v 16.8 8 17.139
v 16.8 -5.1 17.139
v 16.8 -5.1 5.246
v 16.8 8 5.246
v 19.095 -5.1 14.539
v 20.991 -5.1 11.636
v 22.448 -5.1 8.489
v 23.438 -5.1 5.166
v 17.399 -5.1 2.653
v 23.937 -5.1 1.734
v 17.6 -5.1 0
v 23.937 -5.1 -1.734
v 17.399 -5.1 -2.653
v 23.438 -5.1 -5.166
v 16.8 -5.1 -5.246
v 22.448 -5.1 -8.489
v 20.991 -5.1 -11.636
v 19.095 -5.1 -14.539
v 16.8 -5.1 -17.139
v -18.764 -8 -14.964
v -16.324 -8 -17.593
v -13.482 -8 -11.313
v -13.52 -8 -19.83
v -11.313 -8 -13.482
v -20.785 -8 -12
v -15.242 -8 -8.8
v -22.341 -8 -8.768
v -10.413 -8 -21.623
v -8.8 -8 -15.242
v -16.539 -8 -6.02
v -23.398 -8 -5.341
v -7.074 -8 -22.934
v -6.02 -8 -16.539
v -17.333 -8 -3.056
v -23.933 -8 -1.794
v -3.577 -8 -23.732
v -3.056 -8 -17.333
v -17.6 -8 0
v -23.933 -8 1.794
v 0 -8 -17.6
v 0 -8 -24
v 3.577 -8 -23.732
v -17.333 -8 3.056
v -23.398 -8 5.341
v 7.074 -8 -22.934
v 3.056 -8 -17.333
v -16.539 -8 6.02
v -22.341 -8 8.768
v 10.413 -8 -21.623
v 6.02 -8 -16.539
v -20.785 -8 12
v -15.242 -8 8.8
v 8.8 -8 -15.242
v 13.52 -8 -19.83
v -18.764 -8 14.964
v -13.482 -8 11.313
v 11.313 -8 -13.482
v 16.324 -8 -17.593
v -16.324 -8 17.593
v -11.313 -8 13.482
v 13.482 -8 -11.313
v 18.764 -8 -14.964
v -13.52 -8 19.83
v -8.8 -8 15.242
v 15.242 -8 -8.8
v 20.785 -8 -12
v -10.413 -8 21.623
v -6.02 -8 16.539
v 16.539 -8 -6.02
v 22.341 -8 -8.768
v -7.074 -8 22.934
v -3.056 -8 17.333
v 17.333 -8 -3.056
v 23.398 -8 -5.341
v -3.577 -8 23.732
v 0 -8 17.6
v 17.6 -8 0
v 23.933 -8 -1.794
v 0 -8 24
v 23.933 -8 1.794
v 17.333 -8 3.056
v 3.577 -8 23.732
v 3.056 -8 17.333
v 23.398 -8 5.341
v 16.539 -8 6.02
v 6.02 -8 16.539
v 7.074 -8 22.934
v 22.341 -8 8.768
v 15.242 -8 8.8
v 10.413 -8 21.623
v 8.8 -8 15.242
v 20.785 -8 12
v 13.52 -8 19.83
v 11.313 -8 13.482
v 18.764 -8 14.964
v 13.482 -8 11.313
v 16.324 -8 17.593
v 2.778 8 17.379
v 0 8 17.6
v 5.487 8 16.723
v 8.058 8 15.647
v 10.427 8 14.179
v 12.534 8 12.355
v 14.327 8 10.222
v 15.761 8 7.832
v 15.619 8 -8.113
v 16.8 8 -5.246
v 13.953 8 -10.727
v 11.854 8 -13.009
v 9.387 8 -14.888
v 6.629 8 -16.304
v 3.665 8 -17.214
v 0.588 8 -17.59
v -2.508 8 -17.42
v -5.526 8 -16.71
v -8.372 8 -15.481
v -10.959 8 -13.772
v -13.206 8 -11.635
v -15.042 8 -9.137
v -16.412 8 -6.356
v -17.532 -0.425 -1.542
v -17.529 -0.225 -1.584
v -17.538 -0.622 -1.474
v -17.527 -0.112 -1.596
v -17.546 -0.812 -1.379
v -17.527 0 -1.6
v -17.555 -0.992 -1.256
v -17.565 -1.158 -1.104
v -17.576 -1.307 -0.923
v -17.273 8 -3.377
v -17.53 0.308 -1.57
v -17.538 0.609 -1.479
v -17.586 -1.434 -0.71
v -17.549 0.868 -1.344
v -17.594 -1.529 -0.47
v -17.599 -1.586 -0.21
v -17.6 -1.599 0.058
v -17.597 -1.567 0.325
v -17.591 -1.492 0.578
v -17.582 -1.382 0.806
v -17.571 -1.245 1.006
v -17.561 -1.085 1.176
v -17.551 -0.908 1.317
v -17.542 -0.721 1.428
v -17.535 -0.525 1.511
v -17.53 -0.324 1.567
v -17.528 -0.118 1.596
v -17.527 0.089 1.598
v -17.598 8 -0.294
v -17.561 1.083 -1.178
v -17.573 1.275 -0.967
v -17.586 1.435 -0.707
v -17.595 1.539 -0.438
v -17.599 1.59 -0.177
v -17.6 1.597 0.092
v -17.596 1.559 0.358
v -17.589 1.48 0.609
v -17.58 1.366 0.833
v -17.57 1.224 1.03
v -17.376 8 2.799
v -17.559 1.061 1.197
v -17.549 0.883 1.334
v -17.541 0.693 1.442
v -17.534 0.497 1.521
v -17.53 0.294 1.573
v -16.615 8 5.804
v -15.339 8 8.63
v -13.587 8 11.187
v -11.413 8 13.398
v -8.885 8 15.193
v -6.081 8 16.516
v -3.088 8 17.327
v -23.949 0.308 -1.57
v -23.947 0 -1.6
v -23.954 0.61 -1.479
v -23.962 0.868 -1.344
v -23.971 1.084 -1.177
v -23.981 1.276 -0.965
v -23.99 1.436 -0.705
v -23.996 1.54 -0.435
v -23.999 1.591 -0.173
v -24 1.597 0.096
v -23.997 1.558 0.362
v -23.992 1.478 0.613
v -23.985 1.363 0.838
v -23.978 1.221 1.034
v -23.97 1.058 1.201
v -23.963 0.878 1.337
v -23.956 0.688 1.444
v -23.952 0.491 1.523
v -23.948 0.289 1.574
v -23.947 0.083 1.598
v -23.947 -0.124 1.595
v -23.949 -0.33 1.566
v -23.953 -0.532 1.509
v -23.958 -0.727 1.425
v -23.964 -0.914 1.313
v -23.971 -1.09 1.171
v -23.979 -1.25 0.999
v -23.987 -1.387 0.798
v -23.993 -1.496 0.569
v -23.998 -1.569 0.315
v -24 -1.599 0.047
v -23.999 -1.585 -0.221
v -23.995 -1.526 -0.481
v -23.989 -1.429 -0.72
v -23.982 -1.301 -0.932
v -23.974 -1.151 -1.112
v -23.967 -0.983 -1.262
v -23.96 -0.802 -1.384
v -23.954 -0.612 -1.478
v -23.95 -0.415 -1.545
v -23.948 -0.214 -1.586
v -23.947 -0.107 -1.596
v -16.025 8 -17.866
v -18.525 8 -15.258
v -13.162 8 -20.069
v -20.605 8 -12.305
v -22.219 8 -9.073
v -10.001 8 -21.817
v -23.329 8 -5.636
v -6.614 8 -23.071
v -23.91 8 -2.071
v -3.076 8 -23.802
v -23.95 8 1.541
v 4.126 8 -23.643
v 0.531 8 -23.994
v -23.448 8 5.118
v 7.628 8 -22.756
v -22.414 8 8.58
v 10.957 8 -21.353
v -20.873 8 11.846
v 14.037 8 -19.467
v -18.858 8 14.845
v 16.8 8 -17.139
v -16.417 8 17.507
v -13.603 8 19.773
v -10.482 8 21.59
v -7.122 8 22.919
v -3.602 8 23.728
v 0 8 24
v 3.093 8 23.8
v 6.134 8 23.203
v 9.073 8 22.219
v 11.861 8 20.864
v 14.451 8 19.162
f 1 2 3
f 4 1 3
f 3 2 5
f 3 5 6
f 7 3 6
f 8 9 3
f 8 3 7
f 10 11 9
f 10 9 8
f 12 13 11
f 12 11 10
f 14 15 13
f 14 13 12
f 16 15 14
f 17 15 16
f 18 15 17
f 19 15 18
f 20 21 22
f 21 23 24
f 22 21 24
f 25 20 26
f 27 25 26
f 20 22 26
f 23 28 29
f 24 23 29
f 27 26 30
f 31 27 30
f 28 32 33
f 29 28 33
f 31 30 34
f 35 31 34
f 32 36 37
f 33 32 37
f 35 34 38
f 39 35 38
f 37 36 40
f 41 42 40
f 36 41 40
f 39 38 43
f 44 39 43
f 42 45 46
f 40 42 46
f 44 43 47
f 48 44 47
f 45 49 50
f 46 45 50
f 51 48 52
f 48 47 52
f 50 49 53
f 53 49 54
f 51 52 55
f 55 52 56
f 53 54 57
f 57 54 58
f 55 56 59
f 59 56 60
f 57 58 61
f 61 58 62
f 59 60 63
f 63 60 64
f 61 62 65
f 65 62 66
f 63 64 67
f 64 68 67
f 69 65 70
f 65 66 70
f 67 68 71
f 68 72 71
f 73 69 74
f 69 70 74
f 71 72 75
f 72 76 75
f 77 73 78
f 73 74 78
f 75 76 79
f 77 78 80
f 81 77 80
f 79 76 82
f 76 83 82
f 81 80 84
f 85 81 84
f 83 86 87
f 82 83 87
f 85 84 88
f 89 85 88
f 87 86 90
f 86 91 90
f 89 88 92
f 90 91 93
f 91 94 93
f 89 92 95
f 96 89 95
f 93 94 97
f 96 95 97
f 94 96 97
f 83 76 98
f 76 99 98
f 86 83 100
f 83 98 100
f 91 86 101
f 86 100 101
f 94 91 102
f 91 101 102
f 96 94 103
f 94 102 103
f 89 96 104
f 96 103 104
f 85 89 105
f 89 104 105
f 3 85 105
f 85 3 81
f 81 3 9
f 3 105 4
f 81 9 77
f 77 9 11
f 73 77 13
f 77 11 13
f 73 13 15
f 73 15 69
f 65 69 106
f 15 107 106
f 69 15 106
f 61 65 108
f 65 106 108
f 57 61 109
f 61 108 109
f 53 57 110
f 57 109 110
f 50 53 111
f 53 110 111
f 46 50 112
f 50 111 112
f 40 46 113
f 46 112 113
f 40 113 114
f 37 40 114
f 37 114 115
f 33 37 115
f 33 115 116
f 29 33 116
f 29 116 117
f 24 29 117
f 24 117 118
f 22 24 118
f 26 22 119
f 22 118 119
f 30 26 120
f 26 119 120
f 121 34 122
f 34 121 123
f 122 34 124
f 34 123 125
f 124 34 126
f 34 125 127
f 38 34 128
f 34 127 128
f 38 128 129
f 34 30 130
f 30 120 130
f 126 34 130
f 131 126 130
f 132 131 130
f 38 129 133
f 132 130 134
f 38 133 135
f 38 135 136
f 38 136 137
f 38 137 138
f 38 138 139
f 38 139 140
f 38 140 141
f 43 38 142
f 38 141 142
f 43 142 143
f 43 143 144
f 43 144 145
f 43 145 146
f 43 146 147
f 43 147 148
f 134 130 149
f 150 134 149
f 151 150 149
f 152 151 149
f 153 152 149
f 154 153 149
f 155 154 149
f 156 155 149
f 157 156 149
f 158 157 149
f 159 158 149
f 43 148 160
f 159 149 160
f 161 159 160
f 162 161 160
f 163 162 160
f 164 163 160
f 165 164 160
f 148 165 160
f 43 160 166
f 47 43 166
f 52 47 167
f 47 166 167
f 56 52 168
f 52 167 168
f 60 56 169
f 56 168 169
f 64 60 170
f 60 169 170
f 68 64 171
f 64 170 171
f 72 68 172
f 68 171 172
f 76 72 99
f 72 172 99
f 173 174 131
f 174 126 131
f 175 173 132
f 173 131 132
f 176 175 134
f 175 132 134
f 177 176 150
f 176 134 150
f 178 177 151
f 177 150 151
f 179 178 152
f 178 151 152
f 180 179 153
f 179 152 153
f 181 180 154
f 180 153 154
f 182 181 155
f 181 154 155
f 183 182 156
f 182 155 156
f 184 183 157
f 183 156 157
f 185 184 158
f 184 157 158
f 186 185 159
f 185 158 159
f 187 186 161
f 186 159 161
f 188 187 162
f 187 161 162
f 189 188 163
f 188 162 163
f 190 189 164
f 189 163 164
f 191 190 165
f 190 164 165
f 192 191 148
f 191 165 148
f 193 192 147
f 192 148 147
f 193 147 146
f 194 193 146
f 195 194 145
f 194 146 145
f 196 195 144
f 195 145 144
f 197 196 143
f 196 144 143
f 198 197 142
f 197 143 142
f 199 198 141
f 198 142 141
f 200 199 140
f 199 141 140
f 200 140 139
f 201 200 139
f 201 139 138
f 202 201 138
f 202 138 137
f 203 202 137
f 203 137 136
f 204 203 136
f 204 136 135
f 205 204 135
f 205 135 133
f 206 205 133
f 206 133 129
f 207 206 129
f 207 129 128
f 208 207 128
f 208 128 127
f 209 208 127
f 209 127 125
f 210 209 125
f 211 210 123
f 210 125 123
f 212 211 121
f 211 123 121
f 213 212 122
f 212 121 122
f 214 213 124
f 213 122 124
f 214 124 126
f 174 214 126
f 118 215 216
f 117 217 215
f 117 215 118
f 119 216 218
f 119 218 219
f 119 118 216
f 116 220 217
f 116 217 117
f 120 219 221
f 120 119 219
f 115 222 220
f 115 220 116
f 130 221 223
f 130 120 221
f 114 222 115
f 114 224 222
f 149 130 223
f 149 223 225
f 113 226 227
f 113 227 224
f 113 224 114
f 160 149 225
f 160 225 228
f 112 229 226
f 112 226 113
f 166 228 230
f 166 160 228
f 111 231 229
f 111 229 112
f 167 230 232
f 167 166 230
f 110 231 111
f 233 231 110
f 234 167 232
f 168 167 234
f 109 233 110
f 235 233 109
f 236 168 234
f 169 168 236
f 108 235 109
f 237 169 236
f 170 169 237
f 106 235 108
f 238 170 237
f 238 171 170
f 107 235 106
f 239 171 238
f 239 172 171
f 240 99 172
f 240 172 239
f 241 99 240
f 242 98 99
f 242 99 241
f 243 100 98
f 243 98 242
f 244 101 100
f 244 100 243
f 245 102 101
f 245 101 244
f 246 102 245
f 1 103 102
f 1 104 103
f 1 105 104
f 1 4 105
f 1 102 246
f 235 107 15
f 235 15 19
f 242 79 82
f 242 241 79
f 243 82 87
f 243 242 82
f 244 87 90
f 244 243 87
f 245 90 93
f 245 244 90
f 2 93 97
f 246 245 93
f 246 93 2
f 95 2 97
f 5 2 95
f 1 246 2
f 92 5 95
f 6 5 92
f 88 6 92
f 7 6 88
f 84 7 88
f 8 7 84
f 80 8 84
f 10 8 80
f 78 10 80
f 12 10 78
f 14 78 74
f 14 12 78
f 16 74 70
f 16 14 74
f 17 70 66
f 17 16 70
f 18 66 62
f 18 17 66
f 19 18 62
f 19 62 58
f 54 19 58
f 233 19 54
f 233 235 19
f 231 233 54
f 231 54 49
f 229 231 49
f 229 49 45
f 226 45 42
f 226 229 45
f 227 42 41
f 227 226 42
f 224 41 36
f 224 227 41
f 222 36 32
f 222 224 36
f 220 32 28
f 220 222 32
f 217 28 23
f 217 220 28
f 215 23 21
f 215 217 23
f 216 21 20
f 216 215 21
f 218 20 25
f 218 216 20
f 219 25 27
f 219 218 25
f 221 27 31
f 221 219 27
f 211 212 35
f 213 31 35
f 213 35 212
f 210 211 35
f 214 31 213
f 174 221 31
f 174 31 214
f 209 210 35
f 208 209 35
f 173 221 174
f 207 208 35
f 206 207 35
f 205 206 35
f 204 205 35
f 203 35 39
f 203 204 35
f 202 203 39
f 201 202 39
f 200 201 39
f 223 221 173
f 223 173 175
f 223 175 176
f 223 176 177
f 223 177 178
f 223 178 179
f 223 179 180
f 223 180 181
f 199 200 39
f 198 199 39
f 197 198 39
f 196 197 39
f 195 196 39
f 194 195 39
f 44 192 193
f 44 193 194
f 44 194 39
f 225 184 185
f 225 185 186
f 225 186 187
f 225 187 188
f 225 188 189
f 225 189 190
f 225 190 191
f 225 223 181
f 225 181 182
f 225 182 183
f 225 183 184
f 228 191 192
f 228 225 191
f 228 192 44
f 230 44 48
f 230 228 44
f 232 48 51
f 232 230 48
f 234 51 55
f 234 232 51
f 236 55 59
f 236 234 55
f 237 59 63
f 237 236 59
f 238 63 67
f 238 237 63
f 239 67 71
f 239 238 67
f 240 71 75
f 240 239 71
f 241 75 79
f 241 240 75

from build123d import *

# Parameters (mm, degrees)
SKETCH1_R           = 24
BOSS_EXTRUDE1_DEPTH = 8
SKETCH2_R           = 17.6
CUT_EXTRUDE1_DEPTH  = 16
CUT_EXTRUDE2_START  = -5.1
SKETCH3_W           = 10.2
SKETCH3_H           = 96
CUT_EXTRUDE2_DEPTH  = 15.1
SKETCH4_R           = 1.6
CUT_EXTRUDE3_DEPTH  = 60


with BuildPart() as part:
    # Sketch1 → Boss-Extrude1 (new, symmetric)
    with BuildSketch(Plane(origin=(0, 0, 0), x_dir=(1, 0, 0), z_dir=(0, 1, 0))):
        with Locations(Location((0, 0, 0), (0, 0, 270))):
            Circle(SKETCH1_R)
    extrude(amount=BOSS_EXTRUDE1_DEPTH, both=True)

    # Sketch2 → Cut-Extrude1 (cut, symmetric)
    with BuildSketch(Plane(origin=(0, 0, 0), x_dir=(1, 0, 0), z_dir=(0, 1, 0))):
        with Locations(Location((0, 0, 0), (0, 0, 270))):
            Circle(SKETCH2_R)
    extrude(amount=CUT_EXTRUDE1_DEPTH, both=True, mode=Mode.SUBTRACT)

    # Sketch3 → Cut-Extrude2 (cut)
    with BuildSketch(Plane(origin=(0, 0, 0), x_dir=(1, 0, 0), z_dir=(0, 1, 0)).offset(CUT_EXTRUDE2_START)):
        with Locations((21.9, 0)):
            Rectangle(SKETCH3_W, SKETCH3_H)
    extrude(amount=CUT_EXTRUDE2_DEPTH, mode=Mode.SUBTRACT)

    # Sketch4 → Cut-Extrude3 (cut, symmetric)
    with BuildSketch(Plane(origin=(0, 0, 0), x_dir=(0, 0, -1), z_dir=(1, 0, 0))):
        Circle(SKETCH4_R)
    extrude(amount=CUT_EXTRUDE3_DEPTH, both=True, mode=Mode.SUBTRACT)


solid = part.part
